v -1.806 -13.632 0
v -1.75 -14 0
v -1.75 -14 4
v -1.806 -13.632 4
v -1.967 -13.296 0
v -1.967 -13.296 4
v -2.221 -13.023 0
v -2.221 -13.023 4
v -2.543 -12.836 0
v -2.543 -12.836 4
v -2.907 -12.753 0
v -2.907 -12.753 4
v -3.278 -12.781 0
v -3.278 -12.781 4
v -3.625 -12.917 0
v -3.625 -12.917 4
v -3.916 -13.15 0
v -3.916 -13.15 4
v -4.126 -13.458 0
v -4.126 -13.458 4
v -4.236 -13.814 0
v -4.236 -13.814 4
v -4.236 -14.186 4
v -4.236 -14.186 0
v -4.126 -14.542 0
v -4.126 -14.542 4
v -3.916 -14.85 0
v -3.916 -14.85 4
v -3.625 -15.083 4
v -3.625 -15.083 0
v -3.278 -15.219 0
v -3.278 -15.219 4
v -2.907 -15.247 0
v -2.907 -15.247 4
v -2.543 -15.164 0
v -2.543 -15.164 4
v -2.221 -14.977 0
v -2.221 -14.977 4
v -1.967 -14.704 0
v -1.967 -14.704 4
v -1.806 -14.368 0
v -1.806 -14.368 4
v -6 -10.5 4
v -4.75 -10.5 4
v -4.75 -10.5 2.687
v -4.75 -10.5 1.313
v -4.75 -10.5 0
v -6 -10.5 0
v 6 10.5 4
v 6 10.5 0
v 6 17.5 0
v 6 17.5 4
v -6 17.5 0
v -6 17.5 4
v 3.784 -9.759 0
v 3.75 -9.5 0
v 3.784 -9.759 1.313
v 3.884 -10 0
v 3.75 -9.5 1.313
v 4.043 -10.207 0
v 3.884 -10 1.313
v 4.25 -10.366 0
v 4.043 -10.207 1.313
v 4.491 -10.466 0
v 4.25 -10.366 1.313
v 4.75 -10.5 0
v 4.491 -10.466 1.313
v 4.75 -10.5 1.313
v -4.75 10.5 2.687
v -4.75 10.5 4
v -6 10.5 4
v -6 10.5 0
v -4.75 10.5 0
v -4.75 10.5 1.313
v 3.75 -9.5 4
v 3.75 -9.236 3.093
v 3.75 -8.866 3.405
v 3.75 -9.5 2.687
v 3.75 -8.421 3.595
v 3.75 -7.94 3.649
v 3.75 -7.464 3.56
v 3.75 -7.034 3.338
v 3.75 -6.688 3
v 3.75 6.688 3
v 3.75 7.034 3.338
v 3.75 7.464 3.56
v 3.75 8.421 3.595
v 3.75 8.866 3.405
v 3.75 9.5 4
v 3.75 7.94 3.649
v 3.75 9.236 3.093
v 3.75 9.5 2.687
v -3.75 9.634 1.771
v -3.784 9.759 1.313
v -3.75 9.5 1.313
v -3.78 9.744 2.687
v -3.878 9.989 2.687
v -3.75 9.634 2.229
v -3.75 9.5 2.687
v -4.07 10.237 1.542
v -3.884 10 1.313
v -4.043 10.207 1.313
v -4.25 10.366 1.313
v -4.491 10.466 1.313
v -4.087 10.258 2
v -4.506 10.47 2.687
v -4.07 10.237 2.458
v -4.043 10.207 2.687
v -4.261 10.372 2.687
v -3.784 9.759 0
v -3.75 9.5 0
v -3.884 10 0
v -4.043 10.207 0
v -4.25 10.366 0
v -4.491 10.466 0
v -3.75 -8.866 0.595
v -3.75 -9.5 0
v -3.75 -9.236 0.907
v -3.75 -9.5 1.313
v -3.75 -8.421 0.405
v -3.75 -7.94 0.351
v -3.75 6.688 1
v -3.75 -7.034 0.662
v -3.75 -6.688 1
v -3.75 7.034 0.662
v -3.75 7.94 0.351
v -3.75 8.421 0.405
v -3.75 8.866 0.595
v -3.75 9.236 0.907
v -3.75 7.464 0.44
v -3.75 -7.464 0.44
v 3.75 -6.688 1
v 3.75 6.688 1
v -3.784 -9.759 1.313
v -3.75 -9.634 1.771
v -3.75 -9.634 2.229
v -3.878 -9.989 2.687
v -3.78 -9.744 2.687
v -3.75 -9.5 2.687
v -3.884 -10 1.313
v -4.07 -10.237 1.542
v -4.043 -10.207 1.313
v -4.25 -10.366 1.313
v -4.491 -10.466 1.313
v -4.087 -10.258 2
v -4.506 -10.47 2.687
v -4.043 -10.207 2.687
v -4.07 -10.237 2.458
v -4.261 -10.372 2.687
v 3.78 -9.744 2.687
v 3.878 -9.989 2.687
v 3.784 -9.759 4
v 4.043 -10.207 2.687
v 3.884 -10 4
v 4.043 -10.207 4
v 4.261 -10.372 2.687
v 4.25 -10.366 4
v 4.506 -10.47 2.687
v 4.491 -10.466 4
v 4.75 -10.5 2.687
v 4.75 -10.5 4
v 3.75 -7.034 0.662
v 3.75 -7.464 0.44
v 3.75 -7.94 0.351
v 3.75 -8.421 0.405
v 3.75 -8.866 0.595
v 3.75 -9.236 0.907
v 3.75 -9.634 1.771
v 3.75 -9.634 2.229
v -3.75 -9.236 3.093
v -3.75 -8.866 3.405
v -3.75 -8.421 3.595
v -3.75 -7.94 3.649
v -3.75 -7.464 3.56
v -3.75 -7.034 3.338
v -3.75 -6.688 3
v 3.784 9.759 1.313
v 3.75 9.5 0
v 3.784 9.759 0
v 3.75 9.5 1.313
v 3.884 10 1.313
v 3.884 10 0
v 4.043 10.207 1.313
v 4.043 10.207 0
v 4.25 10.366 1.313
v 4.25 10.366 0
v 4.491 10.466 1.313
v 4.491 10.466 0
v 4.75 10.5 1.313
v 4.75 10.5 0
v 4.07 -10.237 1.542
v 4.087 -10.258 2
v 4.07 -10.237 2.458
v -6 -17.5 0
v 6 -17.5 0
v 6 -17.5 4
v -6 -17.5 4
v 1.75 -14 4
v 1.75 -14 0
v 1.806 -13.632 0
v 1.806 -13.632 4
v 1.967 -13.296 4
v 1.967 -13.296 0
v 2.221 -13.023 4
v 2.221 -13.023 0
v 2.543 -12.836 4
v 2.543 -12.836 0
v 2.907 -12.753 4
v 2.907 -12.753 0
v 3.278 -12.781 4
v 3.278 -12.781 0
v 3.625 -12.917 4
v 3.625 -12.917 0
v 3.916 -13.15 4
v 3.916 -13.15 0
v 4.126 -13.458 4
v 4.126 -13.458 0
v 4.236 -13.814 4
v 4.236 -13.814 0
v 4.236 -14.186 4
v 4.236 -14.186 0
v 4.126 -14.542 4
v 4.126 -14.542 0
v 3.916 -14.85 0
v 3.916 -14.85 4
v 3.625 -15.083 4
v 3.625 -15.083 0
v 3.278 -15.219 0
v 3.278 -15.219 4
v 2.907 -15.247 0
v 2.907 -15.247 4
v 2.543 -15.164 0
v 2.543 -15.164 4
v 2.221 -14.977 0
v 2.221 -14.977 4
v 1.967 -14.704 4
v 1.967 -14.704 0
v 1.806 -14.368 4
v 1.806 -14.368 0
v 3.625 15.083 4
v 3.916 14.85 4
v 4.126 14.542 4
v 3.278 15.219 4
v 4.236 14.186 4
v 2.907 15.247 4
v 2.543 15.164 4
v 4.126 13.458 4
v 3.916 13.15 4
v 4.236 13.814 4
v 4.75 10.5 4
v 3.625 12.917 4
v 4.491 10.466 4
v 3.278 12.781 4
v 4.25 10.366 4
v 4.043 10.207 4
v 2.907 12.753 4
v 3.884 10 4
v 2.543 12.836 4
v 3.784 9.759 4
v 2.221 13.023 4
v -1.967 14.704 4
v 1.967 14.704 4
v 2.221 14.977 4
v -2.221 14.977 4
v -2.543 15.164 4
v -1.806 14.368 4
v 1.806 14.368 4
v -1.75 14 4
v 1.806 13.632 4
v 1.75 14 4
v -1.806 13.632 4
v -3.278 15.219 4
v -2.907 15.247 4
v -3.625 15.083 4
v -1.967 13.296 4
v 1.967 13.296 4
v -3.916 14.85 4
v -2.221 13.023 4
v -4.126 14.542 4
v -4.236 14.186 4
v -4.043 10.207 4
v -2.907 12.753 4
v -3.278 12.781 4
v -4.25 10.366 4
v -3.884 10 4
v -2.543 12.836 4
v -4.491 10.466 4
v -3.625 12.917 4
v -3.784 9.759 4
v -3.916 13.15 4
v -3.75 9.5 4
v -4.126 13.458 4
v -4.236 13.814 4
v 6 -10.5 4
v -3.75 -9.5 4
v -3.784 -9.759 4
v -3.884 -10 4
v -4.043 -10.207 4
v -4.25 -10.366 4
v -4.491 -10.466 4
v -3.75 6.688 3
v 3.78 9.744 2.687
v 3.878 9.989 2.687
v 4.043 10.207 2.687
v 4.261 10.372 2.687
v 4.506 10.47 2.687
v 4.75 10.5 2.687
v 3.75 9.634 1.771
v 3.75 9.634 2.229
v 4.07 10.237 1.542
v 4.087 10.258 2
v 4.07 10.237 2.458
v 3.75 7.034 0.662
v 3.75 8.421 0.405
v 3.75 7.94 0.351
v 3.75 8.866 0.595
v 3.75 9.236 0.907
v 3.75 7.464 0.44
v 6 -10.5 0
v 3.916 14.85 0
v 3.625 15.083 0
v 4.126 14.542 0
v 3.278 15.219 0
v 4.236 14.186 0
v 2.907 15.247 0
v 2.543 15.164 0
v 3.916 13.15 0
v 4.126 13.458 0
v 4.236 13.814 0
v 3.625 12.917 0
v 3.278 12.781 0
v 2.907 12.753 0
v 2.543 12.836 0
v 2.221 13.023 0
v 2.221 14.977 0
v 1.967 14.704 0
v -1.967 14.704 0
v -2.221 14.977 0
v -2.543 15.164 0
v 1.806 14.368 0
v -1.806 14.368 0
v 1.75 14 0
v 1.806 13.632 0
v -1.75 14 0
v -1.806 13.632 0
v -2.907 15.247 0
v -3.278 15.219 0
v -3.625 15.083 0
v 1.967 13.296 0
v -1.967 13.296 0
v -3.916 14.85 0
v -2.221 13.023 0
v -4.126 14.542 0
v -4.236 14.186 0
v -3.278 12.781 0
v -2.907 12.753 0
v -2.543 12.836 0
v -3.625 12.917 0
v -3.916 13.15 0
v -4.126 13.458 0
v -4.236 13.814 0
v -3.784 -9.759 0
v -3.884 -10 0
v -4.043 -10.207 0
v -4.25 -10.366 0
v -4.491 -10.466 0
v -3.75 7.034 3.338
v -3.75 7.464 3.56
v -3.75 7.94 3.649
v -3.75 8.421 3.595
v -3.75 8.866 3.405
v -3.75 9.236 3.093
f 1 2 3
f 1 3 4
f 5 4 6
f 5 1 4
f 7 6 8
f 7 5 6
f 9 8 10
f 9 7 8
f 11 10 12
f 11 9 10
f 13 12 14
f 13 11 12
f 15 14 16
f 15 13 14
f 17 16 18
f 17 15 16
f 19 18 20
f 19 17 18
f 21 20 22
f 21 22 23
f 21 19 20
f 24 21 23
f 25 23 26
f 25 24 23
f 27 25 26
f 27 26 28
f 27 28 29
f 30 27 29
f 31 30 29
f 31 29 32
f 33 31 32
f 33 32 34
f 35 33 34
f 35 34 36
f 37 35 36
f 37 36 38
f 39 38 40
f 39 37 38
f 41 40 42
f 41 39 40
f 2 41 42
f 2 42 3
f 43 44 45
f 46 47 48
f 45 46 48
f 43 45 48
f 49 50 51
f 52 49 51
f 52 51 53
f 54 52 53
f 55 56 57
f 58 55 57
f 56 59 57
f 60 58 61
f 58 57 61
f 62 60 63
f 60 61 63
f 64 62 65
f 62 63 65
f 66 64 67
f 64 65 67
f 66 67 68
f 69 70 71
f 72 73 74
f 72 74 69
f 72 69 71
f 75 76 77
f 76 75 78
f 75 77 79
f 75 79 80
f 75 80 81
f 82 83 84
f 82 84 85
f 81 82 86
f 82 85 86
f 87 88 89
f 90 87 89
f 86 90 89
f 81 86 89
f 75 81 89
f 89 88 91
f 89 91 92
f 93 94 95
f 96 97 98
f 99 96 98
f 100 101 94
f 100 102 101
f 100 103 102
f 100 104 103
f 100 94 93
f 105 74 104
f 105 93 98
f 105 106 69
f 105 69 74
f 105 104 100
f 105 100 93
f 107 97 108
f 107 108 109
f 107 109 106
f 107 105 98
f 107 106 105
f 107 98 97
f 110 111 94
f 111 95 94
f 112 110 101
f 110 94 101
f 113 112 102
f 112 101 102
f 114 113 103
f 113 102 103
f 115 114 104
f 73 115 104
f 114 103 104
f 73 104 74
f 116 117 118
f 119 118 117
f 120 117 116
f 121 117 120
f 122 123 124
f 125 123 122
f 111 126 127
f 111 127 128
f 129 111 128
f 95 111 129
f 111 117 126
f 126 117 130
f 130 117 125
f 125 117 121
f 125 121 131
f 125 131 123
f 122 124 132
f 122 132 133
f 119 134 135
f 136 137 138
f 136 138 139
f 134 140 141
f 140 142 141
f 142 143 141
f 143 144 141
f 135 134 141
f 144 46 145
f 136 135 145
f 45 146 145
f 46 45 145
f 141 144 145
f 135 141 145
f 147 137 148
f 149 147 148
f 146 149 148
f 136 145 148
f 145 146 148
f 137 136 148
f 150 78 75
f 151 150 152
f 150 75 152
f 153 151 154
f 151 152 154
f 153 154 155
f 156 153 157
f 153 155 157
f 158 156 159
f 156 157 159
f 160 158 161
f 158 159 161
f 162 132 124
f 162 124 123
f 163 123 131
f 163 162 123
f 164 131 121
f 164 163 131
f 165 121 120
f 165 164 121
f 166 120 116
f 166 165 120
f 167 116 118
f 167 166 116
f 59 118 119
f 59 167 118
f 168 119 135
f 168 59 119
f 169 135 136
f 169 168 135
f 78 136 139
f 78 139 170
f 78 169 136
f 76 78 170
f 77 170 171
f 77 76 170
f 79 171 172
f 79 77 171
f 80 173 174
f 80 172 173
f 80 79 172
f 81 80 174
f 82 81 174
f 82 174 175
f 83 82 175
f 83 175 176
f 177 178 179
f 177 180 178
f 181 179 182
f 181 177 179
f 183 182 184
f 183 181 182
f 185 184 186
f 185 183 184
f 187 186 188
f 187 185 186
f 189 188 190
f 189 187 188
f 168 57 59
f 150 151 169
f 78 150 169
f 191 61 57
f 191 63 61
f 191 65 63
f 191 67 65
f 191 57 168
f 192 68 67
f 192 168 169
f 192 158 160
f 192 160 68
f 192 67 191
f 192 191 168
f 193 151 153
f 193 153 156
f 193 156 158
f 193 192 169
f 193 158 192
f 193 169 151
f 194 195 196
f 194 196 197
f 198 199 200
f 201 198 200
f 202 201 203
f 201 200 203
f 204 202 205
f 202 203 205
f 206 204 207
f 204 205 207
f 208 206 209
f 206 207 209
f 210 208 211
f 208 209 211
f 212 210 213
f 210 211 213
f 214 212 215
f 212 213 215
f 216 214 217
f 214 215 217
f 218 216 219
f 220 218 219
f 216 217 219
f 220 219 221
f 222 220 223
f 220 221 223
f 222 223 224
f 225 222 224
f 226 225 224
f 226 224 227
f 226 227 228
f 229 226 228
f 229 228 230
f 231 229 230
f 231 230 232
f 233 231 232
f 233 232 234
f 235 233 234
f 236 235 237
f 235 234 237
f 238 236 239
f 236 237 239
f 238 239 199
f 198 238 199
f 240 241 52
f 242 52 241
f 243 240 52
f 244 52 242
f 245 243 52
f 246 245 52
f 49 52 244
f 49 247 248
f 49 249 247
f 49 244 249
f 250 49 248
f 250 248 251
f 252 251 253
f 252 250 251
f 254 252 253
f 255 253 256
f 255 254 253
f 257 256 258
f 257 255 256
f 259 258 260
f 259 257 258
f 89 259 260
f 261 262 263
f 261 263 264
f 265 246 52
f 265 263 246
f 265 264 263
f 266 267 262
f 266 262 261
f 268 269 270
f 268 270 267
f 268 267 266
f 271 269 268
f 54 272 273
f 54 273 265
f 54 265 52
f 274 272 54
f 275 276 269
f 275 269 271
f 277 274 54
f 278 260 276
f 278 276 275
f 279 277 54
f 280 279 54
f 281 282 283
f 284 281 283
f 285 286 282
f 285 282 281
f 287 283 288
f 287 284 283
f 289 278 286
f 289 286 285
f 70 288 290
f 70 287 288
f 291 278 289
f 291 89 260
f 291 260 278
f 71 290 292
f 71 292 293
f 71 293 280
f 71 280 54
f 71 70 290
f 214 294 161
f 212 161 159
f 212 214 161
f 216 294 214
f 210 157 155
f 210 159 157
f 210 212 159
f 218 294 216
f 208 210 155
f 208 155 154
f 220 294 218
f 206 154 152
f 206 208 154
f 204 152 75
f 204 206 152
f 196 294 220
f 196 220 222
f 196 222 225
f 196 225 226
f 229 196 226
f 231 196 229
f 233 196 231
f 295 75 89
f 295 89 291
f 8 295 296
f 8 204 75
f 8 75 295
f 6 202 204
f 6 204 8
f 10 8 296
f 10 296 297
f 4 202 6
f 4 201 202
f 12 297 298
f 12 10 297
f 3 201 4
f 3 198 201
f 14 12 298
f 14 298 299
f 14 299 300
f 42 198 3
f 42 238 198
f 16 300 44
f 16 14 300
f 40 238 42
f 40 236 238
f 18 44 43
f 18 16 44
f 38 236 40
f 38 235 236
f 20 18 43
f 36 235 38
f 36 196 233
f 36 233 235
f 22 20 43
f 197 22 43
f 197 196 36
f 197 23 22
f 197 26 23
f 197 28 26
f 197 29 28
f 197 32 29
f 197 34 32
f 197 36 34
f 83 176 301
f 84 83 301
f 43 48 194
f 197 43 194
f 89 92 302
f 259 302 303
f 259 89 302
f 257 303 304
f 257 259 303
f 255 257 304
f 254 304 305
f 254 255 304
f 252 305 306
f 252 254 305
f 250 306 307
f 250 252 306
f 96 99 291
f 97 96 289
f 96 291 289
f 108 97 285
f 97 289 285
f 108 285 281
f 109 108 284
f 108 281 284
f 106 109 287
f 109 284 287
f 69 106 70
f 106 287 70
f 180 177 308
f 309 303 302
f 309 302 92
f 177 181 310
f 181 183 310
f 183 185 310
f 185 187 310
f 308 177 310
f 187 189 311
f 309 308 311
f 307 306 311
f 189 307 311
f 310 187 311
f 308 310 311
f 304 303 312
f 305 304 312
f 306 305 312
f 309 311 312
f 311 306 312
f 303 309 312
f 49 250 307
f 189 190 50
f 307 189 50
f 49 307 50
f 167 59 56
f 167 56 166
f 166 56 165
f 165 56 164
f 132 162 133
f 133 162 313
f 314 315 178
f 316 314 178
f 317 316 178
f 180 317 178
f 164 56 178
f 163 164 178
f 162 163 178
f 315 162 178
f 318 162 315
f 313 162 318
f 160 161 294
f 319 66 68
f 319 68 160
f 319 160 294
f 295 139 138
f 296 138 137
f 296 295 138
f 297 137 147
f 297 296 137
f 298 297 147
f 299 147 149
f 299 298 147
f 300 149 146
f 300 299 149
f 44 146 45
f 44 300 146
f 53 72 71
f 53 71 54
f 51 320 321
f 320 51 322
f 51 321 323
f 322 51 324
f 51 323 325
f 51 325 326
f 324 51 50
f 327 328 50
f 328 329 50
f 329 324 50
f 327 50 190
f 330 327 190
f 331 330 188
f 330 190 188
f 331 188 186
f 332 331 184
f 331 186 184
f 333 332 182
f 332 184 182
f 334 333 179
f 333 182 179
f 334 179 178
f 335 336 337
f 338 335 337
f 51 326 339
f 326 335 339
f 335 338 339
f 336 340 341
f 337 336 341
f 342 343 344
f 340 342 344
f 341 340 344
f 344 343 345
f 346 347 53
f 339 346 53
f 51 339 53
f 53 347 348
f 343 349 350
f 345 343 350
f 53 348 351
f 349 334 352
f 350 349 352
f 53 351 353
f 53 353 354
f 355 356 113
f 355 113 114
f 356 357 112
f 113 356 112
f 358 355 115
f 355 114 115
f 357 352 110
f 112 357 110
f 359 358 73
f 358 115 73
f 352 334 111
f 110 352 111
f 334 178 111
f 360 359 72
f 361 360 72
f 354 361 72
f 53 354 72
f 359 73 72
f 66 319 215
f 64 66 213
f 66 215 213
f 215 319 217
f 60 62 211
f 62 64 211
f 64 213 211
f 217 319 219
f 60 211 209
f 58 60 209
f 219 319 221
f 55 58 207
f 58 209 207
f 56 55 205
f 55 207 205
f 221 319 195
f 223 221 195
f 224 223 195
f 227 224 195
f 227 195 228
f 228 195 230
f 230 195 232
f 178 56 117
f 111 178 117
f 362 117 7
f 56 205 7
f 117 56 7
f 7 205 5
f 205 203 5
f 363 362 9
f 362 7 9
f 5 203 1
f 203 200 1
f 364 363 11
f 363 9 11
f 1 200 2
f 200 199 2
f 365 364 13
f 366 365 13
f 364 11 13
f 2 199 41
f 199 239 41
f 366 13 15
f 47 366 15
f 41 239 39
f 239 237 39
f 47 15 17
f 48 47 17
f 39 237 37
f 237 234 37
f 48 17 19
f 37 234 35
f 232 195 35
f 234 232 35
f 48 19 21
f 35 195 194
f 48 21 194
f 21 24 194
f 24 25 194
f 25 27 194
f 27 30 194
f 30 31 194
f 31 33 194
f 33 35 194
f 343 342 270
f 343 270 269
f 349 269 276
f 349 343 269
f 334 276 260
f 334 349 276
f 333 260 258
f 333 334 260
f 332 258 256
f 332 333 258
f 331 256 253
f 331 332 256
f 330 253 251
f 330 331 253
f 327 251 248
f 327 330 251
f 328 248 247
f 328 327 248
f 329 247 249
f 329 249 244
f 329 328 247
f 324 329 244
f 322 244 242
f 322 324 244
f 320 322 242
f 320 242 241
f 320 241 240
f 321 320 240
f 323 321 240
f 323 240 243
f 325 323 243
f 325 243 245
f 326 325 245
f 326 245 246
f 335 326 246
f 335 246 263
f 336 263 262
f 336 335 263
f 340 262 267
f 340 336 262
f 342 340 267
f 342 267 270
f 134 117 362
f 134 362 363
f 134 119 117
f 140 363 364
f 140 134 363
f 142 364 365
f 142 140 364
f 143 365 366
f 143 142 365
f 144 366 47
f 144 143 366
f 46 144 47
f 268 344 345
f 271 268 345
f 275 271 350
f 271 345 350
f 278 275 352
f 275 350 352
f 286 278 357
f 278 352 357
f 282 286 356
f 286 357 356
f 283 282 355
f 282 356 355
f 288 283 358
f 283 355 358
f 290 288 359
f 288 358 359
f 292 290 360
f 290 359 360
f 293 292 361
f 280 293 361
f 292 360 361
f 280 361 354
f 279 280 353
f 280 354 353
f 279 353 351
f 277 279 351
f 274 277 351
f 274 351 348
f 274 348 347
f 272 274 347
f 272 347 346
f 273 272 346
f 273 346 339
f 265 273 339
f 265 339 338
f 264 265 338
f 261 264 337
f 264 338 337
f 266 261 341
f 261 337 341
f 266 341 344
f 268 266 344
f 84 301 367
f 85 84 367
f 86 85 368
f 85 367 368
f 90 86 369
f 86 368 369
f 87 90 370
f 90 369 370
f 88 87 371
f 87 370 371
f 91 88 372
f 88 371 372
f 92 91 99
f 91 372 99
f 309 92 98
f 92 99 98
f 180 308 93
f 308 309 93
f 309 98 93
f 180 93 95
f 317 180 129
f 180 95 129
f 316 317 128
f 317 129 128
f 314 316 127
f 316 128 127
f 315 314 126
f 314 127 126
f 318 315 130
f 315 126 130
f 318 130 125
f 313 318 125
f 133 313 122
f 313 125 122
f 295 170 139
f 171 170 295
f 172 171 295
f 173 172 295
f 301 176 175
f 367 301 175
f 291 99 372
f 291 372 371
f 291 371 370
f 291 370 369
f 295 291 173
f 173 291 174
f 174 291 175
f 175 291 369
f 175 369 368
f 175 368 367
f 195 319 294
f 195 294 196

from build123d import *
from build123d.topology import SkipClean

# Parameters (mm, degrees)
SKETCH1_R                = 1.25
BOSS_EXTRUDE1_DEPTH      = 4
SKETCH2_R                = 1.65
BOSS_EXTRUDE2_DEPTH      = 3.75
SKETCH2_2_R              = 1.65
CUT_EXTRUDE1_DEPTH       = 19.338824935
MIRROR19_COPY_1_SKETCH_R = 1.25
MIRROR19_COPY_1_DEPTH    = 4
MIRROR19_COPY_2_SKETCH_R = 1.65
MIRROR19_COPY_2_DEPTH    = 3.75
MIRROR19_COPY_3_SKETCH_R = 1.65
MIRROR19_COPY_3_DEPTH    = 19.338824935
MIRROR19_COPY_4_SKETCH_R = 1.65
MIRROR19_COPY_4_DEPTH    = 3.75
MIRROR19_COPY_5_SKETCH_R = 1.65
MIRROR19_COPY_5_DEPTH    = 19.338824935
SKETCH4_W                = 2
SKETCH4_H                = 15.373217597
CUT_EXTRUDE3_DEPTH       = 21.428228019
FILLET1_R                = 1


with BuildPart() as part:
    # Sketch1 → Boss-Extrude1 (new body)
    with BuildSketch(Plane.XY):
        Polygon((0, 0), (-3.75, 0), (-3.75, -10.5), (-6, -10.5), (-6, -17.5), (0, -17.5), align=None)
        with Locations((-3, -14)):
            Circle(SKETCH1_R, mode=Mode.SUBTRACT)
    boss_extrude1 = extrude(amount=BOSS_EXTRUDE1_DEPTH)

    # Sketch2 → Boss-Extrude2 (add, through all)
    with BuildSketch(Plane.ZY.offset(3.75)):
        with Locations((2, -8)):
            Circle(SKETCH2_R)
    boss_extrude2 = extrude(amount=-BOSS_EXTRUDE2_DEPTH)

    # Sketch2<2> → Cut-Extrude1 (cut, through all)
    with BuildSketch(Plane.ZY.offset(3.75)):
        with Locations(Location((2, -8, 0), (0, 0, 270))):
            Circle(SKETCH2_2_R)
    cut_extrude1 = extrude(amount=-CUT_EXTRUDE1_DEPTH, mode=Mode.SUBTRACT)

    # Mirror6: Boss-Extrude1, Boss-Extrude2, Cut-Extrude1 across plane
    add(boss_extrude1.mirror(Plane(origin=(0, -17.5, 4), x_dir=(0, 0, 1), z_dir=(-1, 0, 0))))
    add(boss_extrude2.mirror(Plane(origin=(0, -17.5, 4), x_dir=(0, 0, 1), z_dir=(-1, 0, 0))))
    add(cut_extrude1.mirror(Plane(origin=(0, -17.5, 4), x_dir=(0, 0, 1), z_dir=(-1, 0, 0))), mode=Mode.SUBTRACT)

    # Mirror19: Boss-Extrude1 across plane
    add(boss_extrude1.mirror(Plane.ZX))

    # Mirror19 copy 1 sketch → Mirror19 copy 1 (add)
    with BuildSketch(Plane(origin=(0, 0, 0), x_dir=(-1, 0, 0), z_dir=(0, 0, 1))):
        Polygon((0, 0), (-3.75, 0), (-3.75, -10.5), (-6, -10.5), (-6, -17.5), (0, -17.5), align=None)
        with Locations((-3, -14)):
            Circle(MIRROR19_COPY_1_SKETCH_R, mode=Mode.SUBTRACT)
    extrude(amount=MIRROR19_COPY_1_DEPTH)

    # Mirror19 copy 2 sketch → Mirror19 copy 2 (add, through all)
    with BuildSketch(Plane(origin=(3.75, 0, 0), x_dir=(0, 0, 1), z_dir=(1, 0, 0))):
        with Locations((2, -8)):
            Circle(MIRROR19_COPY_2_SKETCH_R)
    extrude(amount=-MIRROR19_COPY_2_DEPTH)

    # Mirror19 copy 3 sketch → Mirror19 copy 3 (cut, through all)
    with BuildSketch(Plane(origin=(3.75, 0, 0), x_dir=(0, 0, 1), z_dir=(1, 0, 0))):
        with Locations(Location((2, -8, 0), (0, 0, 270))):
            Circle(MIRROR19_COPY_3_SKETCH_R)
    extrude(amount=-MIRROR19_COPY_3_DEPTH, mode=Mode.SUBTRACT)

    # Mirror19 copy 4 sketch → Mirror19 copy 4 (add, through all)
    with BuildSketch(Plane.ZY.offset(3.75)):
        with Locations((2, 8)):
            Circle(MIRROR19_COPY_4_SKETCH_R)
    extrude(amount=-MIRROR19_COPY_4_DEPTH)

    # Mirror19 copy 5 sketch → Mirror19 copy 5 (cut, through all)
    with BuildSketch(Plane.ZY.offset(3.75)):
        with Locations((2, 8)):
            Circle(MIRROR19_COPY_5_SKETCH_R)
    extrude(amount=-MIRROR19_COPY_5_DEPTH, mode=Mode.SUBTRACT)

    # Sketch4 → Cut-Extrude3 (cut, through all)
    with SkipClean():  # the faces are left unmerged after this step: merging them gives an invalid solid
        with BuildSketch(Plane.ZY.offset(3.75)):
            with Locations((2, -0.3266625)):
                Rectangle(SKETCH4_W, SKETCH4_H)
        extrude(amount=-CUT_EXTRUDE3_DEPTH, mode=Mode.SUBTRACT)
    add(part.part.scale(1), mode=Mode.REPLACE)  # the faces are merged on a copy

    # Fillet1
    fillet1_edges = [part.edges().sort_by_distance(p)[0] for p in [
        (-3.75, -10.5, 2),
        (3.75, -10.5, 2),
        (-3.75, 10.5, 2),
        (3.75, 10.5, 2),
    ]]
    fillet(fillet1_edges, radius=FILLET1_R)


solid = part.part
